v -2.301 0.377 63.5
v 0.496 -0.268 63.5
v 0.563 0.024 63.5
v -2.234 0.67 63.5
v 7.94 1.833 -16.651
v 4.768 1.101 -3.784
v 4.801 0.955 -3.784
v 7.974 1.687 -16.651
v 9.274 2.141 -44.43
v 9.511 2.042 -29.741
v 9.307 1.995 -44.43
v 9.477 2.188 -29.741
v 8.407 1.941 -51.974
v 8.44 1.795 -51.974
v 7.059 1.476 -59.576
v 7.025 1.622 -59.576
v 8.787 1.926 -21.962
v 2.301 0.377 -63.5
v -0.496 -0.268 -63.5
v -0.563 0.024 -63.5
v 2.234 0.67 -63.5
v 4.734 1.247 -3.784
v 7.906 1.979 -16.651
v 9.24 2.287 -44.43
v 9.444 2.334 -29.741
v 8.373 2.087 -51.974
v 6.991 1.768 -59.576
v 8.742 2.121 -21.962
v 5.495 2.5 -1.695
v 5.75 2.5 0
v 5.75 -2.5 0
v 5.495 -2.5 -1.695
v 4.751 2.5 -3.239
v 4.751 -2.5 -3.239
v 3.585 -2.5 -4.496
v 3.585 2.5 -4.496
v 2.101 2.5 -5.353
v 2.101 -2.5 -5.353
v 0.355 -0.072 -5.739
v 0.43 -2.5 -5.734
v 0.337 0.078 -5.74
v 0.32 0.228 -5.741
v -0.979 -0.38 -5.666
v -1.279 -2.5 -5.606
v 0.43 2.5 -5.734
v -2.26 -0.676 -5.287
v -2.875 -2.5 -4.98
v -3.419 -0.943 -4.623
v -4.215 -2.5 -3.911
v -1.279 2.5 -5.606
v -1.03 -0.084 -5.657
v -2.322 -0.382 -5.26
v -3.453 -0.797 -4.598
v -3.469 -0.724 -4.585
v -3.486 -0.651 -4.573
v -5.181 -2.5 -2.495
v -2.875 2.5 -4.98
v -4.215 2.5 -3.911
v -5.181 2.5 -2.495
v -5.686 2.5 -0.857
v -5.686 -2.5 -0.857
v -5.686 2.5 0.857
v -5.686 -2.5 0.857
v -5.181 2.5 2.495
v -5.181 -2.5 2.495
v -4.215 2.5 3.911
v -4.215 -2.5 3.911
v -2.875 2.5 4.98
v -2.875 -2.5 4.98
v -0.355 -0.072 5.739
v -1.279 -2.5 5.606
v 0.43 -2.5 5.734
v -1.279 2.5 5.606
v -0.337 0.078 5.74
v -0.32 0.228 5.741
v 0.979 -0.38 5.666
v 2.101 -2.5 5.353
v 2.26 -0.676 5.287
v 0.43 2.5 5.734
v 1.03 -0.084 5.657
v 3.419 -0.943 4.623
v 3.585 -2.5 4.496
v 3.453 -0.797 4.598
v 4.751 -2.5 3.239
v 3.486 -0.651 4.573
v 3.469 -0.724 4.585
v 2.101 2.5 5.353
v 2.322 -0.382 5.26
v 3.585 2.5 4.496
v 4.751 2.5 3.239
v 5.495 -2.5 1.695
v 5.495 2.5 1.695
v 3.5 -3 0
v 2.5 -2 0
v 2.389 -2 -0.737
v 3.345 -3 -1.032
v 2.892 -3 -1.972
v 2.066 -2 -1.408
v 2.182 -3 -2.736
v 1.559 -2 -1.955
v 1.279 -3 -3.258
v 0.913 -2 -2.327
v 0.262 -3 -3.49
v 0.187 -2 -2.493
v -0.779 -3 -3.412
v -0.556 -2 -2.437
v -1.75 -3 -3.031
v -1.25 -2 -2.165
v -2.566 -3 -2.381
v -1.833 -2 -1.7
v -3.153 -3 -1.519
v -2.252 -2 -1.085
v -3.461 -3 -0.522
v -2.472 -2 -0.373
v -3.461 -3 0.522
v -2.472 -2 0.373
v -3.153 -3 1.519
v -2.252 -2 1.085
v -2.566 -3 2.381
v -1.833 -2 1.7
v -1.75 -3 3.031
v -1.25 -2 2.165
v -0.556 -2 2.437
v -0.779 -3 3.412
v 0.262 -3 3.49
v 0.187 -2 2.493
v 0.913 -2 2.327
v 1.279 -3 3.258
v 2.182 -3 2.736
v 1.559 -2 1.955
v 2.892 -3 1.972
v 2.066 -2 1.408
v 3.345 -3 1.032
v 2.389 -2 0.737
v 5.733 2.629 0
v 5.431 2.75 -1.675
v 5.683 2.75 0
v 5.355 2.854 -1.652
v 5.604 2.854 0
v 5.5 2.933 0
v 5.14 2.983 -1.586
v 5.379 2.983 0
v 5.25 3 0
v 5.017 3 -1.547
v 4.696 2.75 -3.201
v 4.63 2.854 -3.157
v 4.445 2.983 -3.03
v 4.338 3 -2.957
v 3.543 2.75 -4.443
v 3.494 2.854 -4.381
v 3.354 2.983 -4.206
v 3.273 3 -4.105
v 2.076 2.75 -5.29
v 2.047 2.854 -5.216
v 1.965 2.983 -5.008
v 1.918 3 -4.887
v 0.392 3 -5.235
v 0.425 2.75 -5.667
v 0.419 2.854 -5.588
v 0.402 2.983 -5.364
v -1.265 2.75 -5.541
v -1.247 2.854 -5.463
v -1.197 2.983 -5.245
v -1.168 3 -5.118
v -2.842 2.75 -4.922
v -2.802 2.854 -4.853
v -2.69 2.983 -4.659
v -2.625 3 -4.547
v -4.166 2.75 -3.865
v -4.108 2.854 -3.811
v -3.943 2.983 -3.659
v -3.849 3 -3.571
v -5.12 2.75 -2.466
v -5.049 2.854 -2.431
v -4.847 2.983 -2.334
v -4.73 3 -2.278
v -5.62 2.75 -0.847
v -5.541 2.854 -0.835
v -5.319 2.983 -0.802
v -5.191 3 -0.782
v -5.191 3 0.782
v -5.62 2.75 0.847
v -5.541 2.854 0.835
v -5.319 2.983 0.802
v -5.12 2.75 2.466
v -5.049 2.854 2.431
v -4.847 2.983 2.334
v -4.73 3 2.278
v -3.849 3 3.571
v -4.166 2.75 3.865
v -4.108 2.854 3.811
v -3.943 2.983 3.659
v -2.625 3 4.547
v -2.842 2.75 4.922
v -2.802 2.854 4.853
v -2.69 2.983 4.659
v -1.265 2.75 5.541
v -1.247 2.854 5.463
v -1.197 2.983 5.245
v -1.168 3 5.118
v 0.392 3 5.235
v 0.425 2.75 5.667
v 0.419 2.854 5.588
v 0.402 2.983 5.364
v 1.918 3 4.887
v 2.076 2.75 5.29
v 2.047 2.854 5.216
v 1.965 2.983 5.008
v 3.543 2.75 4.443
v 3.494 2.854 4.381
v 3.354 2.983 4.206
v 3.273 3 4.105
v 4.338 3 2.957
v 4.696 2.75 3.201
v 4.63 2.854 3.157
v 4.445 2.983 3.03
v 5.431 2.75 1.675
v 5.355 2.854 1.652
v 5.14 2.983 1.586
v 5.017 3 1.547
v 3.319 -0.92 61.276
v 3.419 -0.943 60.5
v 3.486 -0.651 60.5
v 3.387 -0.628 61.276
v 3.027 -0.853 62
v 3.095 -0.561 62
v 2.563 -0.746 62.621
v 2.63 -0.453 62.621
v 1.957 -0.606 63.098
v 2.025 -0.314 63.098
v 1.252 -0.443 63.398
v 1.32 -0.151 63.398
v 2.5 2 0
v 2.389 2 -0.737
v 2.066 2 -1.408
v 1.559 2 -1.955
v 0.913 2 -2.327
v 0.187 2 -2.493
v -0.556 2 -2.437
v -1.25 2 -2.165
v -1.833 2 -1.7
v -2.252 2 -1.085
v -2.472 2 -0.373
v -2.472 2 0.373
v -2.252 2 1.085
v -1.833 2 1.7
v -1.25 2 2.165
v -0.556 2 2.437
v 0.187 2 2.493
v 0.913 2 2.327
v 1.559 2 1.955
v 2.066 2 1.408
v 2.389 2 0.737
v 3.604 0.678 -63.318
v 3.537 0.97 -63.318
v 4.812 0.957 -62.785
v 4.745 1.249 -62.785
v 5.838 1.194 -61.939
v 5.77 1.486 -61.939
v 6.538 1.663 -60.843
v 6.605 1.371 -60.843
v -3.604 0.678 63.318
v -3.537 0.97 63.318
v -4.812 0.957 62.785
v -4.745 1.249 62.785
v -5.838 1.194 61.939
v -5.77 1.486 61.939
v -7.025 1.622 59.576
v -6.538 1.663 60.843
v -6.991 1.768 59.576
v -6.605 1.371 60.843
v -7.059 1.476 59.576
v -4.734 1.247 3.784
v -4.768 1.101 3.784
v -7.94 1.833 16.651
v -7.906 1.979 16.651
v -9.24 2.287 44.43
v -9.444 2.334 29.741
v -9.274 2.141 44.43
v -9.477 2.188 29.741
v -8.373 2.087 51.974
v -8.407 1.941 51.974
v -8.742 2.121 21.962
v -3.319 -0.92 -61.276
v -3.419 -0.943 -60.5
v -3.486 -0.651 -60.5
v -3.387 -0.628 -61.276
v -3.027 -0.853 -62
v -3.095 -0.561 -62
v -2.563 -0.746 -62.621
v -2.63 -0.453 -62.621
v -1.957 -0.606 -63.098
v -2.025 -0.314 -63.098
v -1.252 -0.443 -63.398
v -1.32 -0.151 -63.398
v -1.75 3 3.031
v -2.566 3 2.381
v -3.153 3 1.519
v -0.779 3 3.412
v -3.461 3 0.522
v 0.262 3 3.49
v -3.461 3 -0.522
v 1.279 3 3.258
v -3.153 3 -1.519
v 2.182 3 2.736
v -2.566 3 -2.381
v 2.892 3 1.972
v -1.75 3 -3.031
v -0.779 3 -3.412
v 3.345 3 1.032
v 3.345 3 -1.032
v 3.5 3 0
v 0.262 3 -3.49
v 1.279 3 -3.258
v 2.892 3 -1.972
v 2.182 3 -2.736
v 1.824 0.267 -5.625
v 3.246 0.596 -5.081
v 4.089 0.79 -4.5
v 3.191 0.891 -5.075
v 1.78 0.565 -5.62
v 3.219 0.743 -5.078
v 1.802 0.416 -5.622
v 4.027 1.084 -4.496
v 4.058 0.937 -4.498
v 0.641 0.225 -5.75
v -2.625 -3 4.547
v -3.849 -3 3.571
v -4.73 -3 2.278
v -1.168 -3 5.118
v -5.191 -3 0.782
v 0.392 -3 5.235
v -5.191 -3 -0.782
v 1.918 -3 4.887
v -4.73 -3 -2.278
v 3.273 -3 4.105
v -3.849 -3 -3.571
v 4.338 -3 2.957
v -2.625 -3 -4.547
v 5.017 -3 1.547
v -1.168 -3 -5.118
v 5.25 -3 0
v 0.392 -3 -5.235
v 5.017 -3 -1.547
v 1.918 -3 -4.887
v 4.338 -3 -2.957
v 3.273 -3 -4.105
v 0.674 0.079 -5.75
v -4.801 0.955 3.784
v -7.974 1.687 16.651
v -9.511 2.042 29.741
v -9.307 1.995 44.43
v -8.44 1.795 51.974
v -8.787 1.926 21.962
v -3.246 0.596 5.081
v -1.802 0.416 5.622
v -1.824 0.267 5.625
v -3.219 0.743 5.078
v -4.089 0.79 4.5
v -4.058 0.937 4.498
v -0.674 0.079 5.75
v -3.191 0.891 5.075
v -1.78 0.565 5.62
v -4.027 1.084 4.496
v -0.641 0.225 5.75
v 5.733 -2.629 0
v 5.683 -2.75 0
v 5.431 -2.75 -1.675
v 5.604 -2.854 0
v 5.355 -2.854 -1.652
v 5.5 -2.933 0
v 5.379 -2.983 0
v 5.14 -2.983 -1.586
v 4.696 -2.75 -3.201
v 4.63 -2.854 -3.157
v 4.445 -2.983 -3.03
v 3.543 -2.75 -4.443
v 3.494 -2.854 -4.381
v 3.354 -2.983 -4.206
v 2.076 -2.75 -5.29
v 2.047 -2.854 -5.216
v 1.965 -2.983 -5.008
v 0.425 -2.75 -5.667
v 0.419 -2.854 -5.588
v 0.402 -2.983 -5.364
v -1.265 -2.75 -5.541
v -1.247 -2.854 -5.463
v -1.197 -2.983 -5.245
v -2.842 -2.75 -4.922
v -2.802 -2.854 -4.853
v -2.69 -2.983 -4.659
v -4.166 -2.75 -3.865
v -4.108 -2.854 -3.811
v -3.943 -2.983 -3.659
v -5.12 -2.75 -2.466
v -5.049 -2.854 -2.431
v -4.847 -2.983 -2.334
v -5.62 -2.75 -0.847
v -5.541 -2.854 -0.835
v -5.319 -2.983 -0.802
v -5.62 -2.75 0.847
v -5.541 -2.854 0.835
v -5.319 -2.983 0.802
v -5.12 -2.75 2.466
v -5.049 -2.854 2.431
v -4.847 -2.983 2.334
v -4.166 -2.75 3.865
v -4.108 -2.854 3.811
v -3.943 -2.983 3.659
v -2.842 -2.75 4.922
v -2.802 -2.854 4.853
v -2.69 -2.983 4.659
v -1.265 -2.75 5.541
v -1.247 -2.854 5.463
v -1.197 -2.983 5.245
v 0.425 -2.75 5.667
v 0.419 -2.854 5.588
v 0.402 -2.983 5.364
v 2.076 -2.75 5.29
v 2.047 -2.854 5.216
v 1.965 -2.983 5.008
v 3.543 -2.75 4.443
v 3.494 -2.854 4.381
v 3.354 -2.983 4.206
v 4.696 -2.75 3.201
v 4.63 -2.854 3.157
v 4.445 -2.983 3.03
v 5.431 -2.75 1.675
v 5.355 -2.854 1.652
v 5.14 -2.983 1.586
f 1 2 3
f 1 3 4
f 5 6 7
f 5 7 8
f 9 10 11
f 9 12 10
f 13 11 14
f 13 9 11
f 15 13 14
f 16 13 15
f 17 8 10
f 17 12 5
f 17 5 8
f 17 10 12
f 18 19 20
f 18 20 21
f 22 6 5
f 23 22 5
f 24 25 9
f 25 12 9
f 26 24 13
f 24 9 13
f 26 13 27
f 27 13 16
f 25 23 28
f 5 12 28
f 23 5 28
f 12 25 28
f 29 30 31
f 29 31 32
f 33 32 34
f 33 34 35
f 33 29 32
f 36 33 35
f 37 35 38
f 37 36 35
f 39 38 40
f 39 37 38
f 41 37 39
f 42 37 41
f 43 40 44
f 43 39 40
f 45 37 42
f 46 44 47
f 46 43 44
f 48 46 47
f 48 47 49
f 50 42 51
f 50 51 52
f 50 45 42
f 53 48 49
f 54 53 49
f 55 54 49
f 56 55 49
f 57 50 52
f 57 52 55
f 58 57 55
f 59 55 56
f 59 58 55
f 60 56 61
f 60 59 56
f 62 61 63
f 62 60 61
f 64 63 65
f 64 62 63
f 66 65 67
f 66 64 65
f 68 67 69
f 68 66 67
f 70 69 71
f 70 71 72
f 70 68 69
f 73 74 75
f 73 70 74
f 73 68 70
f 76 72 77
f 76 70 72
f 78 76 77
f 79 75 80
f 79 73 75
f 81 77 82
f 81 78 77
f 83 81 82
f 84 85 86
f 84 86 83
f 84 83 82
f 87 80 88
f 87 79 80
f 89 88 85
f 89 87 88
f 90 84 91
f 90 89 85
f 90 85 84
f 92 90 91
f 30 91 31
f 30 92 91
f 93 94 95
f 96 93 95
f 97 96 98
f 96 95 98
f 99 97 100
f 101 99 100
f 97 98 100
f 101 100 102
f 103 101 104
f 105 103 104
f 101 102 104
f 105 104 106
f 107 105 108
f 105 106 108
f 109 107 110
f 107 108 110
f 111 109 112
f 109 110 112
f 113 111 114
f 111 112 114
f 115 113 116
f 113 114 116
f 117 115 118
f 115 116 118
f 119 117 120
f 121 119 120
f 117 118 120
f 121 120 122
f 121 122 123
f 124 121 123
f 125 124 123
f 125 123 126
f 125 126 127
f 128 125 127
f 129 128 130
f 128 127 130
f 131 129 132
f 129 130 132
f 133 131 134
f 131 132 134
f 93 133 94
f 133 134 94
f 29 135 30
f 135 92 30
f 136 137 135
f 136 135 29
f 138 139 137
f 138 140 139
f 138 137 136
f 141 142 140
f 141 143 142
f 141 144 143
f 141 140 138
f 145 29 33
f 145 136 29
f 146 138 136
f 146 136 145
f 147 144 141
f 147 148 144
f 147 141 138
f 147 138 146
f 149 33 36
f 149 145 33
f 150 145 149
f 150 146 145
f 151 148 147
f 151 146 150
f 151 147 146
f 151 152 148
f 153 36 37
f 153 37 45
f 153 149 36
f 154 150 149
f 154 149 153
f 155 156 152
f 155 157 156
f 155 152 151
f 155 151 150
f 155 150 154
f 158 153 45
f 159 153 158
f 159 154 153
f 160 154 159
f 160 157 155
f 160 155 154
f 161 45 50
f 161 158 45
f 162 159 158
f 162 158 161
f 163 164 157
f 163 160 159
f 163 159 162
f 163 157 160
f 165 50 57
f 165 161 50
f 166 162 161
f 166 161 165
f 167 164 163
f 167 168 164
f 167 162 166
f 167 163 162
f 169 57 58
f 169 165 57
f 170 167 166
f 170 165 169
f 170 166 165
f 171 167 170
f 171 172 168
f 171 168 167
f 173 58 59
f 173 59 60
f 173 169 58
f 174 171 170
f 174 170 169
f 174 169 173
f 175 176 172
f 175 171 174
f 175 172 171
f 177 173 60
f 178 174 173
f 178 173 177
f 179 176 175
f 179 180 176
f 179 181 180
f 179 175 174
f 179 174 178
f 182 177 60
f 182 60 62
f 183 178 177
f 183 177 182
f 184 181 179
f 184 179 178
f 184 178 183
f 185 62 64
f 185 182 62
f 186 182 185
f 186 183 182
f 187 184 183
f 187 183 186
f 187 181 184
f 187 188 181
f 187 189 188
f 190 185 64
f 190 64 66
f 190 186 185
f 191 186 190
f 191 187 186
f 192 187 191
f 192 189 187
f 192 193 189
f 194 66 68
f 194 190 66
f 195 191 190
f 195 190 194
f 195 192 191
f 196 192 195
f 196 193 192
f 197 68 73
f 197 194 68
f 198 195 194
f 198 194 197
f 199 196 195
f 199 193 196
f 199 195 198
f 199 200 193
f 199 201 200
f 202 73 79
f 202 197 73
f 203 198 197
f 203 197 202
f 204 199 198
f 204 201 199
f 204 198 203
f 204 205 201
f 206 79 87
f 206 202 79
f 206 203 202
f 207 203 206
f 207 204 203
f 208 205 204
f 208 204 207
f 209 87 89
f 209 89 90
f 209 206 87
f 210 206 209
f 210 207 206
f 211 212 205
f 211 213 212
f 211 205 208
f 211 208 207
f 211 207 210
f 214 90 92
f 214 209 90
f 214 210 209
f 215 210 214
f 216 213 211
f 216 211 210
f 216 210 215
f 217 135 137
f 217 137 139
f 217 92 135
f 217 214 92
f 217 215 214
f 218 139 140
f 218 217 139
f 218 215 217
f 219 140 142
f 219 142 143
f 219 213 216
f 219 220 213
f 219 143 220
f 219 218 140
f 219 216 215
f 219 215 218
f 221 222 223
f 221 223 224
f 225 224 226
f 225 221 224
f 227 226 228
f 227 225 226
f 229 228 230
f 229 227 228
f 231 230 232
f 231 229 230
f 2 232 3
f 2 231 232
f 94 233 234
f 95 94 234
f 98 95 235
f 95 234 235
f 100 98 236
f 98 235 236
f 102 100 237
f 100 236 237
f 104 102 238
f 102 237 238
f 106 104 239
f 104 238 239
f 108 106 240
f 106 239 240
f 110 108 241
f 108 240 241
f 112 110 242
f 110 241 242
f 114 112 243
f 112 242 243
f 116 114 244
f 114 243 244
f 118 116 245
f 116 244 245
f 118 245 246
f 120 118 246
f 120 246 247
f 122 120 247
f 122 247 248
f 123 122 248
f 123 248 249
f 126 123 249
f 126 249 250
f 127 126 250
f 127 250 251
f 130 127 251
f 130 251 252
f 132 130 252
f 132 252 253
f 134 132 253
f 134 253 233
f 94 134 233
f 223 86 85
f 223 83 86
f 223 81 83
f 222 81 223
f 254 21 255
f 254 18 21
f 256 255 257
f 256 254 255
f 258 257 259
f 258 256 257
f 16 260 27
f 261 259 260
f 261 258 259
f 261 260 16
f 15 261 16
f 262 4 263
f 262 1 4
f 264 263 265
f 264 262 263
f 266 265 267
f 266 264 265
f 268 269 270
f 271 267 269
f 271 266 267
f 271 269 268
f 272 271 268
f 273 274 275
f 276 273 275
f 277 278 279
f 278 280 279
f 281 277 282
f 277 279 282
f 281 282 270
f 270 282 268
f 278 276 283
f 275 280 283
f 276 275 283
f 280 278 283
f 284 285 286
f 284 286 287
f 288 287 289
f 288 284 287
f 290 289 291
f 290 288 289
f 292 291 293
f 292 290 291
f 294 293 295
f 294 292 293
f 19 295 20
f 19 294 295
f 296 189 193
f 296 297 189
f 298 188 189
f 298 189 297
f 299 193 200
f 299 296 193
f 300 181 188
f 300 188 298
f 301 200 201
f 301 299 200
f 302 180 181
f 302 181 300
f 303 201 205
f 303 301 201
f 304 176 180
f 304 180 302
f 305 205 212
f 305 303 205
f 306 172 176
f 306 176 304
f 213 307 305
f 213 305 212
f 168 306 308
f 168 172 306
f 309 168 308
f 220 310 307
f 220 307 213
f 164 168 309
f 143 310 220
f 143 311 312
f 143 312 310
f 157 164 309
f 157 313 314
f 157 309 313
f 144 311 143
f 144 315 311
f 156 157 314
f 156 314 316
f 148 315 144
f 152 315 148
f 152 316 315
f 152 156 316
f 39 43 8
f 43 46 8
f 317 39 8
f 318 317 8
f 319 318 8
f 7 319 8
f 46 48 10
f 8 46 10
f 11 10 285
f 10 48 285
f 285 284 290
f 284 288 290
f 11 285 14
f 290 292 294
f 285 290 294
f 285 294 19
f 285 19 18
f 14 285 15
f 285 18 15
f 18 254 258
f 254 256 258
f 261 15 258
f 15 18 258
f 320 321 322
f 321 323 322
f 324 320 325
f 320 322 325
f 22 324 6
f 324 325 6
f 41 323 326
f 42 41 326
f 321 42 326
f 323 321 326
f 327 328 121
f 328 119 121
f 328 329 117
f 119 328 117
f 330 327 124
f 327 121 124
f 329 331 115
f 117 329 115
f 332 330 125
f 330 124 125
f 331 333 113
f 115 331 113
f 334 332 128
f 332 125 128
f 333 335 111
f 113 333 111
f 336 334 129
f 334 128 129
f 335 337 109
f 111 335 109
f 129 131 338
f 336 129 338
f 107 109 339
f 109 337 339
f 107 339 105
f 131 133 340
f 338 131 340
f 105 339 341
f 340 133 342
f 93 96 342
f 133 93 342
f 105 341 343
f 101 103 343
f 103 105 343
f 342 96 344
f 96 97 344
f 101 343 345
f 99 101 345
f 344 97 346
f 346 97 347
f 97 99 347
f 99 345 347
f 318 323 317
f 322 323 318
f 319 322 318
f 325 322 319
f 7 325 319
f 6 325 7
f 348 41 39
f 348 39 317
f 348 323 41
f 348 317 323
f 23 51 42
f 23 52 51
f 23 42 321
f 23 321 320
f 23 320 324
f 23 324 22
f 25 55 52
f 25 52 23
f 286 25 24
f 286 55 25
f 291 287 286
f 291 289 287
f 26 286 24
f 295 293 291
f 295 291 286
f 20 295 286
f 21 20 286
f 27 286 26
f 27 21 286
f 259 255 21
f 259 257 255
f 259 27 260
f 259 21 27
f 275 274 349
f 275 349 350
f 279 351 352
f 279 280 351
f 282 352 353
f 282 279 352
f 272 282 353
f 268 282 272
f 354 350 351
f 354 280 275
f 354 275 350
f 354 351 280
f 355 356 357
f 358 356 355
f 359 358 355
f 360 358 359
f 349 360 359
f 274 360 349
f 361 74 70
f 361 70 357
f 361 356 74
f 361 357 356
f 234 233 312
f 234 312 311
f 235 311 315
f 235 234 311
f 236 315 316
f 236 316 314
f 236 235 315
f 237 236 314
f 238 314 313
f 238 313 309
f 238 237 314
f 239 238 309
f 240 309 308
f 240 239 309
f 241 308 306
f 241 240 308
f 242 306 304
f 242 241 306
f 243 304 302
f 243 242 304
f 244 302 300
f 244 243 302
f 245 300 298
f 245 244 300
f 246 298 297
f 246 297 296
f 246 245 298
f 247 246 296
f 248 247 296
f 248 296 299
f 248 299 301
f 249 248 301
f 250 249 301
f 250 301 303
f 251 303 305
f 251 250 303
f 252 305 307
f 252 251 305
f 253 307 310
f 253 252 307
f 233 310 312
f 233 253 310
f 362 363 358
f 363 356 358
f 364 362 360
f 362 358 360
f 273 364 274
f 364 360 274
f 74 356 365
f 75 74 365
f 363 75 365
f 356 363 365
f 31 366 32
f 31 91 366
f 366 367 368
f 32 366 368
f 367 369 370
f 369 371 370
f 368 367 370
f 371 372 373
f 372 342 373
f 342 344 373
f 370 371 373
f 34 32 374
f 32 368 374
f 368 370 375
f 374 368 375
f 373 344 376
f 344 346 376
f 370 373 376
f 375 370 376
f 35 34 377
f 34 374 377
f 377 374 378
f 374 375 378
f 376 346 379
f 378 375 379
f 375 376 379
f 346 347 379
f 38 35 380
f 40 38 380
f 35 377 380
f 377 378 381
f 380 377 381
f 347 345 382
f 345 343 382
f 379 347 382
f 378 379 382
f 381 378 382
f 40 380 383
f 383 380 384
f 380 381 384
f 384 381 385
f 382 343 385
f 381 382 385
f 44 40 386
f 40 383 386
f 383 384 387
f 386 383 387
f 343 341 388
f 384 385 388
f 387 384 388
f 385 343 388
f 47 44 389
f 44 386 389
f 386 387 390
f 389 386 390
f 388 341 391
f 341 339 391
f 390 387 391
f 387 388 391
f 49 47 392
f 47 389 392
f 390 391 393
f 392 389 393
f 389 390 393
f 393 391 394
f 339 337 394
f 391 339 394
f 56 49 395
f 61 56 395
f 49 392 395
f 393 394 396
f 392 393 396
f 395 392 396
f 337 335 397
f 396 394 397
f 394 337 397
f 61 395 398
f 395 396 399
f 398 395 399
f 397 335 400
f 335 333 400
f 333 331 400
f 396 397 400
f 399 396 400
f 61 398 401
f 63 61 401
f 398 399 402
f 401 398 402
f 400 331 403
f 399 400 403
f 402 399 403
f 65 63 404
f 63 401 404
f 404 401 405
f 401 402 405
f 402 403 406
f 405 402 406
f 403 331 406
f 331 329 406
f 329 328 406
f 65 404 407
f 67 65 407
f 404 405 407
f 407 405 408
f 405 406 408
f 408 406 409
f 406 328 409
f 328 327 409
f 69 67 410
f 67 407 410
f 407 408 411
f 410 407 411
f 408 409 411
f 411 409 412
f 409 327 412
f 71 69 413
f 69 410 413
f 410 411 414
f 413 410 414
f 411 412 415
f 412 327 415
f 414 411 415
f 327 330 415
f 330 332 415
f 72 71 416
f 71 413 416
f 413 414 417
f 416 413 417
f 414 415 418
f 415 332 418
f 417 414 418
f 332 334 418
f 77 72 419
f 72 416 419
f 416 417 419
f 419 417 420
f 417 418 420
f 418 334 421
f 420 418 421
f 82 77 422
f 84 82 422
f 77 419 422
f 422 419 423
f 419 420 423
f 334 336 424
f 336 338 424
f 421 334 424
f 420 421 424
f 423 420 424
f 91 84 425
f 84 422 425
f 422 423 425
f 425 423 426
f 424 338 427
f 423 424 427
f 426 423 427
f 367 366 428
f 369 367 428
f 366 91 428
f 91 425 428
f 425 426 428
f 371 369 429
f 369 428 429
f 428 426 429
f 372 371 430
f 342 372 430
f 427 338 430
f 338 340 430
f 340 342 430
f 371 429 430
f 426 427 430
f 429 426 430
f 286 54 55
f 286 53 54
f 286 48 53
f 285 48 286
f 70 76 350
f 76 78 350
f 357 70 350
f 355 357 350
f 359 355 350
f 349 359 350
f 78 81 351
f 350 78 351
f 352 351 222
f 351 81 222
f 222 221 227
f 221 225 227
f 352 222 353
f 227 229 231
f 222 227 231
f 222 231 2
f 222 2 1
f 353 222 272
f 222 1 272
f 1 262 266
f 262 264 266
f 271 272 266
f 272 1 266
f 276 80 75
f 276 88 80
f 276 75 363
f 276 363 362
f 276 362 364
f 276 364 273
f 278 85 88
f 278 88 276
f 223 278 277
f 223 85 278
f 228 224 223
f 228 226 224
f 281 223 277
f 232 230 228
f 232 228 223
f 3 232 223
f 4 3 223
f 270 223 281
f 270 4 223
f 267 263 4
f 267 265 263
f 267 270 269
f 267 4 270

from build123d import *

# Parameters (mm, degrees)
SKETCH1_R           = 5.75
BOSS_EXTRUDE1_DEPTH = 3
BOSS_EXTRUDE2_DEPTH = 0.15
CIRPATTERN1_COUNT   = 2
SKETCH4_R           = 2.5
CUT_EXTRUDE1_DEPTH  = 7.0000001
FILLET1_R           = 0.5
CHAMFER1_SIZE       = 1


with BuildPart() as part:
    # Sketch1 → Boss-Extrude1 (new body, symmetric)
    with BuildSketch(Plane(origin=(0, 0, 0), x_dir=(1, 0, 0), z_dir=(0, 1, 0))):
        Circle(SKETCH1_R)
    extrude(amount=BOSS_EXTRUDE1_DEPTH, both=True)

    # Sketch3 → Boss-Extrude2 (add, symmetric)
    with BuildSketch(Plane(origin=(0, 0, 0), x_dir=(0.974370065, -0.224951054, 0), z_dir=(-0.224951054, -0.974370065, 0))):
        with BuildLine():
            add(Edge.make_bspline(
                [(3.543368809, 3.784271818), (1.869103712, 5.75), (-0.674853163, 5.75)],
                knots=[5.430726938, 5.430726938, 5.430726938, 6.283185307, 6.283185307, 6.283185307], degree=2, weights=[1, 0.910531227, 1]))
            Line((3.543368809, 3.784271818), (3.543368809, 60.5))
            ThreePointArc((3.543368809, 60.5), (2.664689152, 62.621320344), (0.543368809, 63.5))
            Line((0.543368809, 63.5), (-2.327174273, 63.5))
            ThreePointArc((-2.327174273, 63.5), (-5.459156928, 62.397522886), (-7.209963904, 59.576273859))
            add(Edge.make_bspline(
                [(-4.893075135, 3.784271818), (-10.655609146, 21.734523113), (-11.43974903, 40.386779673), (-7.209963904, 59.576273859)],
                knots=[0, 0, 0, 0, 0.936316624, 0.936316624, 0.936316624, 0.936316624], degree=3))
            add(Edge.make_bspline(
                [(-0.674853163, 5.75), (-3.218810038, 5.75), (-4.893075135, 3.784271818)],
                knots=[0, 0, 0, 0.852458369, 0.852458369, 0.852458369], degree=2, weights=[1, 0.910531227, 1]))
        make_face()
    boss_extrude2 = extrude(amount=BOSS_EXTRUDE2_DEPTH, both=True)

    # CirPattern1: Boss-Extrude2 ×2 about axis
    cirpattern1_axis = Axis((0, 3, 0), (0, -1, 0))
    for i in range(1, CIRPATTERN1_COUNT):
        add(boss_extrude2.rotate(cirpattern1_axis, i * 360 / CIRPATTERN1_COUNT))

    # Sketch4 → Cut-Extrude1 (cut, through all)
    with BuildSketch(Plane(origin=(0, 3, 0), x_dir=(1, 0, 0), z_dir=(0, 1, 0))):
        Circle(SKETCH4_R)
    extrude(amount=-CUT_EXTRUDE1_DEPTH, mode=Mode.SUBTRACT)

    # Fillet1
    fillet1_edges = [part.edges().sort_by_distance(p)[0] for p in [
        (-5.75, -3, 0),
        (-5.75, 3, 0),
    ]]
    fillet(fillet1_edges, radius=FILLET1_R)

    # Chamfer1
    chamfer1_edges = [part.edges().sort_by_distance(p)[0] for p in [
        (-2.5, -3, 0),
        (-2.5, 3, 0),
    ]]
    chamfer(chamfer1_edges, length=CHAMFER1_SIZE)


solid = part.part
